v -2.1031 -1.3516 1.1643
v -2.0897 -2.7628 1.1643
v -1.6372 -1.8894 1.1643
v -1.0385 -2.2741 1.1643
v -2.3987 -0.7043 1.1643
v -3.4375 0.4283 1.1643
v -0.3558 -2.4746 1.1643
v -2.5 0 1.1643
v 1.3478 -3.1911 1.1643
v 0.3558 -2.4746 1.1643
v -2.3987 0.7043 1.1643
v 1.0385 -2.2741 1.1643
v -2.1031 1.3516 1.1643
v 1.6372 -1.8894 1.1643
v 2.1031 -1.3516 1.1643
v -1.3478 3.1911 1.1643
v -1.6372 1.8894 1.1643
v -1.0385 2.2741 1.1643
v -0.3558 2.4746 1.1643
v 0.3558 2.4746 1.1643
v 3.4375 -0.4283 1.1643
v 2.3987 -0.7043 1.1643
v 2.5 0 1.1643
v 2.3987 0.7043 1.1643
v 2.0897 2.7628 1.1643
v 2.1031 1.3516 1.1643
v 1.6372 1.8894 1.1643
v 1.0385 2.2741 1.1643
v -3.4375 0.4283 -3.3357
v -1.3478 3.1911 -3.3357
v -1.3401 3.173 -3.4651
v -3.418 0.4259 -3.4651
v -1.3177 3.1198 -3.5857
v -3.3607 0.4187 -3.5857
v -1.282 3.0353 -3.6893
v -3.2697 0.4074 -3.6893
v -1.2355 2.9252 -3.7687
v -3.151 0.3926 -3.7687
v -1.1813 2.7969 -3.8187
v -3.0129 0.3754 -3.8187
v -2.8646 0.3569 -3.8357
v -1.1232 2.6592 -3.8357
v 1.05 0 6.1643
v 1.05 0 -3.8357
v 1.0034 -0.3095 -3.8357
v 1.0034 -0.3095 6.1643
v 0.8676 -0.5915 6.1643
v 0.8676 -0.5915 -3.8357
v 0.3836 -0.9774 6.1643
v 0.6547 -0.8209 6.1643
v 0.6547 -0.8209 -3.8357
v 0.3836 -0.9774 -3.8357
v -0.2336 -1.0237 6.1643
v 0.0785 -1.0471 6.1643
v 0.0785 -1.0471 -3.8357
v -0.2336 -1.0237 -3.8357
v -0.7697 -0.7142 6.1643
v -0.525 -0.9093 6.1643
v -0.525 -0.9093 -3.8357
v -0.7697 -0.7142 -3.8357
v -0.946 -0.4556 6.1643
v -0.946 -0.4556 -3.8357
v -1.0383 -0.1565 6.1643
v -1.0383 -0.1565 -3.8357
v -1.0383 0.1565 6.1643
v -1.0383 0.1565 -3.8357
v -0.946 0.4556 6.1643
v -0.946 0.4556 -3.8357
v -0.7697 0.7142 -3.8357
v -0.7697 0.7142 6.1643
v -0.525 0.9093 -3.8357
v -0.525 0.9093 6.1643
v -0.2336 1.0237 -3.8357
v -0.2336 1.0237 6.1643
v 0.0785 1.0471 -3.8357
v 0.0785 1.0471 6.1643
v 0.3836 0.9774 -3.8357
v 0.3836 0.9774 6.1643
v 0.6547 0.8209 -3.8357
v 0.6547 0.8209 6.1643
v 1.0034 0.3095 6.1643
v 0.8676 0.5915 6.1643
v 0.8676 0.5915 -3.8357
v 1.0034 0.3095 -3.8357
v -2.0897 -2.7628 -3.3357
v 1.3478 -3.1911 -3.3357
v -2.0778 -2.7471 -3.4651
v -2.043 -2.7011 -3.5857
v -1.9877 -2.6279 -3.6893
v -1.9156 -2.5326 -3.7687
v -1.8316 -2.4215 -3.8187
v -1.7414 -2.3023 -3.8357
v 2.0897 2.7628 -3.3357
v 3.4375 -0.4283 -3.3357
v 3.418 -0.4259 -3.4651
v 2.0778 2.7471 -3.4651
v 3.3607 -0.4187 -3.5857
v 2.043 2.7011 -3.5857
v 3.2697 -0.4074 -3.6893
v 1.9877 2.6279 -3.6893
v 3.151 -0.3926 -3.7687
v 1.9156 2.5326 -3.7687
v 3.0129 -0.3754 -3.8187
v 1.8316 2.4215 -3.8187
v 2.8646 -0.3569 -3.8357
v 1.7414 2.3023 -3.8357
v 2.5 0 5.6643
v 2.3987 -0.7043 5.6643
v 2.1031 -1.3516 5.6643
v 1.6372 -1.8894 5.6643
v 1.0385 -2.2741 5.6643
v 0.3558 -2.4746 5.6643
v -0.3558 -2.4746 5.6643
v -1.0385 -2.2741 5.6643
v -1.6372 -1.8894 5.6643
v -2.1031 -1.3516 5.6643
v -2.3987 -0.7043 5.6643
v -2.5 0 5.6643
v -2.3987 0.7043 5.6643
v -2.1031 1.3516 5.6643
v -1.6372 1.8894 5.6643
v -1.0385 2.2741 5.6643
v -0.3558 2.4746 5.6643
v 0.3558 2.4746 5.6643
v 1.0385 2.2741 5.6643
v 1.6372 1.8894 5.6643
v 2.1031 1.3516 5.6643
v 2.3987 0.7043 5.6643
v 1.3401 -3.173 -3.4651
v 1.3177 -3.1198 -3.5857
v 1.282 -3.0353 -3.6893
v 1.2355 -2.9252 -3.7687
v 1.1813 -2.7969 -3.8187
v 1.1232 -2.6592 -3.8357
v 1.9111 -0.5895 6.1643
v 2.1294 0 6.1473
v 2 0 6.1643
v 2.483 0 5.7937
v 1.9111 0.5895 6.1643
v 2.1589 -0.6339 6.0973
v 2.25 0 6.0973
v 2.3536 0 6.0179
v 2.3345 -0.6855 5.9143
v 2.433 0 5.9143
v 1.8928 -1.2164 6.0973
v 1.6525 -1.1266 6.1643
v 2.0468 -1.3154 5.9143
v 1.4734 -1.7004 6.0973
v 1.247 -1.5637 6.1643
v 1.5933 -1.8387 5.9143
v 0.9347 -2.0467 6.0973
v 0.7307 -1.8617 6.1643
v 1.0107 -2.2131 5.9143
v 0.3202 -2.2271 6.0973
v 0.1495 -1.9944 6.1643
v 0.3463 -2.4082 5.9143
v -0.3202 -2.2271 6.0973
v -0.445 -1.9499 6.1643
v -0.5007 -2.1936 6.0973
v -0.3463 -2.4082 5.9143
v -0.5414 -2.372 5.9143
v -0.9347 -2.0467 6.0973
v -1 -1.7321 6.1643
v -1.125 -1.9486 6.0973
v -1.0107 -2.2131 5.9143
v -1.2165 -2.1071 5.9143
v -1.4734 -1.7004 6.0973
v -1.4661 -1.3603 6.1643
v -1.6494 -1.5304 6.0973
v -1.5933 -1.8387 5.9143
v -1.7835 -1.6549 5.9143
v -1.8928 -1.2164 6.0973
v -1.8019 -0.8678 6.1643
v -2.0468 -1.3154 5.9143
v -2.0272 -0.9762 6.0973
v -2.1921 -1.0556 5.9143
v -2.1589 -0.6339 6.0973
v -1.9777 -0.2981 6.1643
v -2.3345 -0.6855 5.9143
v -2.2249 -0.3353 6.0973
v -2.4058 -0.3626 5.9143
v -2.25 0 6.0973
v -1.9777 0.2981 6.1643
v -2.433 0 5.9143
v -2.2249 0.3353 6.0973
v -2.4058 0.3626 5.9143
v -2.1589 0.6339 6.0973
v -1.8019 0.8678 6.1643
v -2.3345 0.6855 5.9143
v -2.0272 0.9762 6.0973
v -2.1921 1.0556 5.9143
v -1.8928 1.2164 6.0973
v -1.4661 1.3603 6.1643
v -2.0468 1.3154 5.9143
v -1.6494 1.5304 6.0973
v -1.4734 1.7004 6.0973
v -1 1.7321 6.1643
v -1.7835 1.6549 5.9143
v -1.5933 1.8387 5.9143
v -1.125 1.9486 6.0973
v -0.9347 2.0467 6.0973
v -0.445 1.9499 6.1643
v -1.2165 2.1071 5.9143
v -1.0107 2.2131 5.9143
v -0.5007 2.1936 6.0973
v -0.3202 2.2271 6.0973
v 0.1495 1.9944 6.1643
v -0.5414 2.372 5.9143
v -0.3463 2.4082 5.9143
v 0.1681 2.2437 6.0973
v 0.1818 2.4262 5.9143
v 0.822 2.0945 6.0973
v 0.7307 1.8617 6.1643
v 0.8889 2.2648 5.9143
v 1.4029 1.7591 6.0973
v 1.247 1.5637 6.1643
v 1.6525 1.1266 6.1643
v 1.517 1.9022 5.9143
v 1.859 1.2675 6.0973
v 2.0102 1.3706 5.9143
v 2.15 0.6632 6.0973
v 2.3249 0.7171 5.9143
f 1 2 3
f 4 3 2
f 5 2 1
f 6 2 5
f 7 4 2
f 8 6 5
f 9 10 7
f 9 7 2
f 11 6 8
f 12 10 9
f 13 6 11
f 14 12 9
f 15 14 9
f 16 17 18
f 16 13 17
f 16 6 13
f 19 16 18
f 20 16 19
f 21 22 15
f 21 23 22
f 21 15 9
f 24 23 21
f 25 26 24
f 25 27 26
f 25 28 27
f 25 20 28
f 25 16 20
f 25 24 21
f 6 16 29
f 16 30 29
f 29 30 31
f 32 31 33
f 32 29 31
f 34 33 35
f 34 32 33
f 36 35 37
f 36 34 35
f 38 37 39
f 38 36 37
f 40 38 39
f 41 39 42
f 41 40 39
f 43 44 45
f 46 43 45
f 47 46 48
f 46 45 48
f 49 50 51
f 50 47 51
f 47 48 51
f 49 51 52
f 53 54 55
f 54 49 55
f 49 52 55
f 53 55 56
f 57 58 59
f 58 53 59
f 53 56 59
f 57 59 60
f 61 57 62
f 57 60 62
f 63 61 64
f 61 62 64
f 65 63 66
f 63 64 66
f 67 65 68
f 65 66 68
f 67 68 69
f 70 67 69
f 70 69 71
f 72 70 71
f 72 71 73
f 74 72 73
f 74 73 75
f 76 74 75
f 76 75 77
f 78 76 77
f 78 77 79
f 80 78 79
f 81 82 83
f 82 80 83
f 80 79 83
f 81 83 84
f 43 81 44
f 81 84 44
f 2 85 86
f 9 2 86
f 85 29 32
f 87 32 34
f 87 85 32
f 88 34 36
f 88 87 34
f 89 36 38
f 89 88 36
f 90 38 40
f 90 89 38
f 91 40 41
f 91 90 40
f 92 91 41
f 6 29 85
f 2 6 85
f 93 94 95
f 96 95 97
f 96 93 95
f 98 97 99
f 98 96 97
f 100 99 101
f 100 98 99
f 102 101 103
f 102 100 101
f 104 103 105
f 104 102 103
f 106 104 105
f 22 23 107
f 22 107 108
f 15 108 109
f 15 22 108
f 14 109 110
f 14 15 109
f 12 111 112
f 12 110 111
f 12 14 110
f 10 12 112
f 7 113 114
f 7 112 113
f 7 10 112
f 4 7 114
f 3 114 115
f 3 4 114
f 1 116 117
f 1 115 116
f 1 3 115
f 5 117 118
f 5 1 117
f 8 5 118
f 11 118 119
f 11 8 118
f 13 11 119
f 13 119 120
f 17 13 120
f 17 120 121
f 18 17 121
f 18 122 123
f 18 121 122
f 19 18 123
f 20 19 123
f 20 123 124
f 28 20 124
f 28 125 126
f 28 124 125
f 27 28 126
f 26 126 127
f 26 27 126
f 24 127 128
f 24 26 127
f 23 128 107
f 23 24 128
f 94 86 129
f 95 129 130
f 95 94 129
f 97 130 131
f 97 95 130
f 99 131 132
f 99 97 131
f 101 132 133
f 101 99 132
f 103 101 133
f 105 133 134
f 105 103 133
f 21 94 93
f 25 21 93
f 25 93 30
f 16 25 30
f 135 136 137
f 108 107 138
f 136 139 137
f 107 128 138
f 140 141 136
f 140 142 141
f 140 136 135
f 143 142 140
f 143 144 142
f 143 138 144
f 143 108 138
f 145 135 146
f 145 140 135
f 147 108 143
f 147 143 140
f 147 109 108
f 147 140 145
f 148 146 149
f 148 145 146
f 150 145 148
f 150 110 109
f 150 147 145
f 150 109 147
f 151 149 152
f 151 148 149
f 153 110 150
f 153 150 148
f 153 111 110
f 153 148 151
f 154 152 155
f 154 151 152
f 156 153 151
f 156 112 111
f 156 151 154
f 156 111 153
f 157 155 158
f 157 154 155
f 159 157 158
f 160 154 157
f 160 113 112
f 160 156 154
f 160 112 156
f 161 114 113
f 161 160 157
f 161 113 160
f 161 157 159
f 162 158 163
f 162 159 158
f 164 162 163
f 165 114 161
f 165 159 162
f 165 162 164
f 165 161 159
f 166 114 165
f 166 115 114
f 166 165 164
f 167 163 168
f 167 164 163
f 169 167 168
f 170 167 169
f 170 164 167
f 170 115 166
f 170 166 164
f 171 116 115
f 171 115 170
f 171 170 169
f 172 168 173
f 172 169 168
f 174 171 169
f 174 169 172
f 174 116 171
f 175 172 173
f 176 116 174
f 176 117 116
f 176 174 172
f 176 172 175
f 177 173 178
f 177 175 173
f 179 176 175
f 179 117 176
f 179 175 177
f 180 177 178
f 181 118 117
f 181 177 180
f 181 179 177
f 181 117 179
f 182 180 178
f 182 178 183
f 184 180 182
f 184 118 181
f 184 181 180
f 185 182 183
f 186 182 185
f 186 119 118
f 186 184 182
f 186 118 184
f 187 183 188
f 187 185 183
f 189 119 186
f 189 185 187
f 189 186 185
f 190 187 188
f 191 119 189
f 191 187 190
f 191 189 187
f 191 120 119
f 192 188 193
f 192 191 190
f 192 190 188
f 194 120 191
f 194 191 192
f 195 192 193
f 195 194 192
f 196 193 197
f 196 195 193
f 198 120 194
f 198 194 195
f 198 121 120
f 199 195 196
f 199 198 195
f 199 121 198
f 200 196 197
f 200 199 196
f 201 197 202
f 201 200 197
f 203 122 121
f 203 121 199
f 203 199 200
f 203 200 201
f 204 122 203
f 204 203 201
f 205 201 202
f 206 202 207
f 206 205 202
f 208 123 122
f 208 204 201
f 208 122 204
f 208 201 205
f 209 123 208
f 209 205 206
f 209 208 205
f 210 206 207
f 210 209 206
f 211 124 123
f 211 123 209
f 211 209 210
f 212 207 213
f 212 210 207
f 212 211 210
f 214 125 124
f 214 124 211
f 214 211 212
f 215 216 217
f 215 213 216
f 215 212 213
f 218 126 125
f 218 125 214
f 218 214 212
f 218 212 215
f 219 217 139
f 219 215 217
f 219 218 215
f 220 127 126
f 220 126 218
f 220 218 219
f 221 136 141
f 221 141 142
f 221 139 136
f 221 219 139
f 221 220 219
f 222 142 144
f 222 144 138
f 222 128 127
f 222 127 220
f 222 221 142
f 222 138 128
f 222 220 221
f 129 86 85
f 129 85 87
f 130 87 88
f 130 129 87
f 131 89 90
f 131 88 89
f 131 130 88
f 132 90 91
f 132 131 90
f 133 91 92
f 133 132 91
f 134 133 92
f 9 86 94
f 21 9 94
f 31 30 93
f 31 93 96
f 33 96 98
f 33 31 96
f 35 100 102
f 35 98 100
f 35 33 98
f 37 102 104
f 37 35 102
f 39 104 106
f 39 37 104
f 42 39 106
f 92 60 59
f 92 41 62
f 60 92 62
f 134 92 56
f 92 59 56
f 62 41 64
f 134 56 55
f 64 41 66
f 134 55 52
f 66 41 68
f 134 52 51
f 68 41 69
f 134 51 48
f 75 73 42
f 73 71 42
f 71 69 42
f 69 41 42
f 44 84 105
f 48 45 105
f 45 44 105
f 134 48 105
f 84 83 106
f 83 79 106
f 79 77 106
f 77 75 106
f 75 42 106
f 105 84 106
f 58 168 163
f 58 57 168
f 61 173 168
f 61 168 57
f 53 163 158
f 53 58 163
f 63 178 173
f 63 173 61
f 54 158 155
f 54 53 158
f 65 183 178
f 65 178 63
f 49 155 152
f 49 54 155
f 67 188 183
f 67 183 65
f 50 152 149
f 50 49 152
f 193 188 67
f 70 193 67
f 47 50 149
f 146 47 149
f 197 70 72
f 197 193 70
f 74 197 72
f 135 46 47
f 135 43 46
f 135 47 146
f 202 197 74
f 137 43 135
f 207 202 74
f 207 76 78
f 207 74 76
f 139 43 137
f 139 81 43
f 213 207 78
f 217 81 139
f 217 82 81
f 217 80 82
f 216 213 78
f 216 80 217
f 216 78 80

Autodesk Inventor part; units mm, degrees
ref_plane "YZ Plane" through (0, 0, 0) normal (1, 0, 0) x (0, 1, 0)
ref_plane "XZ Plane" through (0, 0, 0) normal (0, 1, 0) x (-1, 0, 0)
ref_plane "XY Plane" through (0, 0, 0) normal (0, 0, 1) x (1, 0, 0)
sketch "Sketch1" plane through (0, 0, 0) normal (0, 1, 0) x (-1, 0, 0)
  line L0 (-1.05, 6.1643) -> (-2.5, 6.1643)
  line L1 (-2.5, 6.1643) -> (-2.5, 1.1643)
  line L2 (-2.5, 1.1643) -> (-3.5, 1.1643)
  line L3 (-3.5, 1.1643) -> (-3.5, -3.8357)
  line L4 (-3.5, -3.8357) -> (-1.05, -3.8357)
  line L5 (0, -5.8357) -> (0, 8.1643) projected
  line L6 (-1.05, 6.1643) -> (-1.05, -3.8357)
  point P0 (0, 0)
  dimension "d0" = 5
  dimension "d1" = 5
  dimension "d3" = 1.05
  dimension "d4" = 2.5
  dimension "d5" = 3.5
revolve "Revolution1" add sketch "Sketch1" angle 360 about axis through (0, 0, -10) along (0, 0, 1)
sketch "Sketch2" plane through (0, 0, -3.8357) normal (0, 0, -1) x (-1, 0, 0)
  circle A0 centre (0, 0) radius 3.5 projected
  line L0 (1.3478, 3.1911) -> (3.4375, 0.4283)
  line L1 (3.4375, 0.4283) -> (2.0897, -2.7628)
  line L2 (2.0897, -2.7628) -> (-1.3478, -3.1911)
  line L3 (-1.3478, -3.1911) -> (-3.4375, -0.4283)
  line L4 (-3.4375, -0.4283) -> (-2.0897, 2.7628)
  line L5 (-2.0897, 2.7628) -> (1.3478, 3.1911)
  circle A1 centre (0, 0) radius 5.601
  dimension "d8" = 7
  dimension "d10" = 6
extrude "Extrusion1" cut sketch "Sketch2" against normal blind 10 contours A0 | A1
fillet "Fillet2" radius 0.5 7 edges at (-2.7636, -1.1672, -3.8357) (-2.3927, 1.8097, -3.8357) (0.3709, 2.977, -3.8357) (2.7636, 1.1672, -3.8357) (2.3927, -1.8097, -3.8357) (-0.3709, -2.977, -3.8357) (-2.5, 0, 6.1643)
properties part number "Suction_electrode_cap"
